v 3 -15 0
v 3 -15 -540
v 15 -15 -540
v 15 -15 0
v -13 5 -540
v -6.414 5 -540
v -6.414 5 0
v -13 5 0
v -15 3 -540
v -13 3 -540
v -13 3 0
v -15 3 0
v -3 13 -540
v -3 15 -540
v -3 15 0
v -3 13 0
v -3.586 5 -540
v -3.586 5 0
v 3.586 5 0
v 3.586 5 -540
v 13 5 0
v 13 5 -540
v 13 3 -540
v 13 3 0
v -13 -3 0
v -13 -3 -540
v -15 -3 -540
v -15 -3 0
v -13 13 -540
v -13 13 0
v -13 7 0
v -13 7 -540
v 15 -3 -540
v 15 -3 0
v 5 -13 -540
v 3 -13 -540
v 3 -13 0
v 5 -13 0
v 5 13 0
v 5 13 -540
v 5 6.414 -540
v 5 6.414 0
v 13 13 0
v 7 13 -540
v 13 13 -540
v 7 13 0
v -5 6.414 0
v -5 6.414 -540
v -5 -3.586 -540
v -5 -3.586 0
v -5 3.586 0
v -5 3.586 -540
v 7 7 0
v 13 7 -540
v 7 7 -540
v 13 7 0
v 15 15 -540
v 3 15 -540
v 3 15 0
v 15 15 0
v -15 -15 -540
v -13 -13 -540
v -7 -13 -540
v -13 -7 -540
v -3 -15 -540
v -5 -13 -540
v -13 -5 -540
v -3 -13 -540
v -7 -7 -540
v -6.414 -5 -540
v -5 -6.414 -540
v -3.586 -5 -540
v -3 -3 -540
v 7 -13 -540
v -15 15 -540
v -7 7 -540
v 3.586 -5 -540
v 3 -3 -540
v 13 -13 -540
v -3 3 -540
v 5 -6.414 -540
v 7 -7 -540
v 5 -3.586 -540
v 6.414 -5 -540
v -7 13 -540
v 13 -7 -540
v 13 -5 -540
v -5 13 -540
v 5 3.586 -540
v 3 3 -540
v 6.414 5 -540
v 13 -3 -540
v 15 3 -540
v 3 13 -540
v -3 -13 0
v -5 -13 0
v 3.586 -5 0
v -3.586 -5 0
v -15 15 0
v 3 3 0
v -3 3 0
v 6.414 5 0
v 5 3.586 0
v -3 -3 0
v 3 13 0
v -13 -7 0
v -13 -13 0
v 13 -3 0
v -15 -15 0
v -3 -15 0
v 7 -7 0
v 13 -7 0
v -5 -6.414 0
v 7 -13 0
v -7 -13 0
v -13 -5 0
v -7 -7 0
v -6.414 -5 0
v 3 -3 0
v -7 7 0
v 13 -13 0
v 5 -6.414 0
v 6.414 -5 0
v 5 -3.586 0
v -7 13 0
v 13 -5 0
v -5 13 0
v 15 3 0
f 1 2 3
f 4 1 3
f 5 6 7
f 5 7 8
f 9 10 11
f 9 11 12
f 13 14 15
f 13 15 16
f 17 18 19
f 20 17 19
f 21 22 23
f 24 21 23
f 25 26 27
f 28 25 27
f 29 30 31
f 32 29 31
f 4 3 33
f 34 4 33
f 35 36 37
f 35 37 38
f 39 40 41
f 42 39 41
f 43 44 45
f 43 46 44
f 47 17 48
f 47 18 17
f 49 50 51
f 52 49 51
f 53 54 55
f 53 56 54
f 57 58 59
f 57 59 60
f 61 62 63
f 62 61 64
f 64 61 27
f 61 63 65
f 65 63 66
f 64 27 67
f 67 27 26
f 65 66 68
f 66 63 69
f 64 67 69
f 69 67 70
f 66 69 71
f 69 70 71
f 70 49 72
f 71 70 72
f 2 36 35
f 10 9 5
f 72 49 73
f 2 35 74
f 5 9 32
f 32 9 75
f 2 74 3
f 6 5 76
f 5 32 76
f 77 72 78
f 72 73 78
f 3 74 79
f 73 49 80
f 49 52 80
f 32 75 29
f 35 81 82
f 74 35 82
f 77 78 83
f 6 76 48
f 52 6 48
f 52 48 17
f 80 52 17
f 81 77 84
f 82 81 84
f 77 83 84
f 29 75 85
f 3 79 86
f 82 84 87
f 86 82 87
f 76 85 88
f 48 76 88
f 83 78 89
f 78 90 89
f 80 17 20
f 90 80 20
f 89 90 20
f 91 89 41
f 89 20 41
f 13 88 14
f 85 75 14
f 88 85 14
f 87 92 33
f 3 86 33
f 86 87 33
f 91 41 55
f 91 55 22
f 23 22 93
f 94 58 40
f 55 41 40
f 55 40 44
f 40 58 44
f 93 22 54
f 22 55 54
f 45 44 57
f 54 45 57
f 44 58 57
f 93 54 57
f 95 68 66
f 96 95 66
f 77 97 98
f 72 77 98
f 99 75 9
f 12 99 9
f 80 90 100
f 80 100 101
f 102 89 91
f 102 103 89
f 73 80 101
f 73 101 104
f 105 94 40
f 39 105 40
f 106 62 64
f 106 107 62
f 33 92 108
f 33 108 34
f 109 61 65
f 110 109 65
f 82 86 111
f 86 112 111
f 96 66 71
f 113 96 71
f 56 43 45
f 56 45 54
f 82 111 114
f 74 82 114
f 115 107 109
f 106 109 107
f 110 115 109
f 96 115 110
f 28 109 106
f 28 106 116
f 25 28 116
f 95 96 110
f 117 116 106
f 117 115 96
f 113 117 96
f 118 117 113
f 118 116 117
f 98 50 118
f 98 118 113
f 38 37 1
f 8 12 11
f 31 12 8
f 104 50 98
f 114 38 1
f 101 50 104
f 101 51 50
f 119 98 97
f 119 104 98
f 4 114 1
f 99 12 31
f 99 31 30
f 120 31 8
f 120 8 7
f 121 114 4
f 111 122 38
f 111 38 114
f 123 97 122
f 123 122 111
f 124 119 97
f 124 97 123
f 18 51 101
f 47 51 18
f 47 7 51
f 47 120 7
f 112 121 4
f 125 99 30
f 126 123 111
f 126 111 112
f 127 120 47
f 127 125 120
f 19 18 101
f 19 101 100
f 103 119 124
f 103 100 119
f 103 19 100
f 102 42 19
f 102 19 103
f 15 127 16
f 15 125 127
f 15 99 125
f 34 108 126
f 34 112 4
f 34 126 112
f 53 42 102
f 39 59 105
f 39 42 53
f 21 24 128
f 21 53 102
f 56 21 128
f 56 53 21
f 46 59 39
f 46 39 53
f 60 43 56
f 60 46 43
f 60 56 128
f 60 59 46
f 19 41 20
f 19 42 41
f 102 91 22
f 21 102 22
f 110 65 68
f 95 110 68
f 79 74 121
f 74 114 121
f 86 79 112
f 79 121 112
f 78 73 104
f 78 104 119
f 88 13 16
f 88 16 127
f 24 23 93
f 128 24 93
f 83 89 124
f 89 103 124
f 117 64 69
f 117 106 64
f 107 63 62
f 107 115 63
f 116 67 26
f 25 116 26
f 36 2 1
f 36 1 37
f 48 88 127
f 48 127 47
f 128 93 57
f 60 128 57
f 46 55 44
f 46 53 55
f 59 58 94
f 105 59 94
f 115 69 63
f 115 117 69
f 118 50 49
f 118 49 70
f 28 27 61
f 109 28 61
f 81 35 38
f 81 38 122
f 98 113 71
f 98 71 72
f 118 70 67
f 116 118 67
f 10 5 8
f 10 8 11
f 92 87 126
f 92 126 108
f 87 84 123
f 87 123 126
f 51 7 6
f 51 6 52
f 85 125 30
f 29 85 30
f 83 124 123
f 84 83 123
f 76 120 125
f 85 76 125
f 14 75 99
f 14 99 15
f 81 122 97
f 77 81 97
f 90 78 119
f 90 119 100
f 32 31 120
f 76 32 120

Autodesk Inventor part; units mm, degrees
ref_plane "YZ Plane" through (0, 0, 0) normal (1, 0, 0) x (0, 1, 0)
ref_plane "XZ Plane" through (0, 0, 0) normal (0, 1, 0) x (-1, 0, 0)
ref_plane "XY Plane" through (0, 0, 0) normal (0, 0, 1) x (1, 0, 0)
sketch "스케치1" plane through (0, 0, 0) normal (0, 0, 1) x (1, 0, 0)
  line L0 (-15, 15) -> (15, 15)
  line L1 (15, 15) -> (-15, 15)
  line L2 (-15, 15) -> (-15, -15)
  line L3 (-15, -15) -> (15, -15)
  line L4 (15, -15) -> (15, 15)
  line L5 (-15, -15) -> (-5, -15)
  line L6 (-5, -15) -> (-5, -5)
  line L7 (-5, -5) -> (-15, -5)
  line L8 (-15, -5) -> (-15, -15)
  line L9 (-15, 15) -> (-5, 15)
  line L10 (-5, 15) -> (-5, 5)
  line L11 (-5, 5) -> (-15, 5)
  line L12 (-15, 5) -> (-15, 15)
  line L13 (15, -15) -> (5, -15)
  line L14 (5, -15) -> (5, -5)
  line L15 (5, -5) -> (15, -5)
  line L16 (15, -5) -> (15, -15)
  line L17 (15, 15) -> (5, 15)
  line L18 (5, 15) -> (5, 5)
  line L19 (5, 5) -> (15, 5)
  line L20 (15, 5) -> (15, 15)
  line L21 (-13, -7) -> (-7, -7)
  line L22 (-7, -7) -> (-7, -13)
  line L23 (-7, -13) -> (-13, -13)
  line L24 (-13, -13) -> (-13, -7)
  line L25 (-13, 7) -> (-7, 7)
  line L26 (-7, 7) -> (-7, 13)
  line L27 (-7, 13) -> (-13, 13)
  line L28 (-13, 13) -> (-13, 7)
  line L29 (7, -7) -> (7, -13)
  line L30 (7, -13) -> (13, -13)
  line L31 (13, -13) -> (13, -7)
  line L32 (13, -7) -> (7, -7)
  line L33 (7, 7) -> (7, 13)
  line L34 (7, 13) -> (13, 13)
  line L35 (13, 13) -> (13, 7)
  line L36 (13, 7) -> (7, 7)
  line L37 (-5, -15) -> (-3, -15)
  line L38 (-3, -15) -> (-3, -13)
  line L39 (-3, -13) -> (-5, -13)
  line L40 (-5, -13) -> (-5, -15)
  line L41 (5, -15) -> (3, -15)
  line L42 (3, -15) -> (3, -13)
  line L43 (3, -13) -> (5, -13)
  line L44 (5, -13) -> (5, -15)
  line L45 (5, 15) -> (3, 15)
  line L46 (3, 15) -> (3, 13)
  line L47 (3, 13) -> (5, 13)
  line L48 (5, 13) -> (5, 15)
  line L49 (-5, 15) -> (-3, 15)
  line L50 (-3, 15) -> (-3, 13)
  line L51 (-3, 13) -> (-5, 13)
  line L52 (-5, 13) -> (-5, 15)
  line L53 (15, -5) -> (13, -5)
  line L54 (13, -5) -> (13, -3)
  line L55 (13, -3) -> (15, -3)
  line L56 (15, -3) -> (15, -5)
  line L57 (15, 5) -> (13, 5)
  line L58 (13, 5) -> (13, 3)
  line L59 (13, 3) -> (15, 3)
  line L60 (15, 3) -> (15, 5)
  line L61 (-15, -5) -> (-13, -5)
  line L62 (-13, -5) -> (-13, -3)
  line L63 (-13, -3) -> (-15, -3)
  line L64 (-15, -3) -> (-15, -5)
  line L65 (-15, 5) -> (-13, 5)
  line L66 (-13, 5) -> (-13, 3)
  line L67 (-13, 3) -> (-15, 3)
  line L68 (-15, 3) -> (-15, 5)
  line L69 (5, -5) -> (-5, -5)
  line L70 (-5, -5) -> (-5, 5)
  line L71 (-5, 5) -> (5, 5)
  line L72 (5, 5) -> (5, -5)
  line L73 (5, -5) -> (-5, 5) construction
  line L74 (-5, -5) -> (5, 5) construction
  line L75 (-3.5858, -5) -> (-5, -3.5858)
  line L76 (-5, -3.5858) -> (-6.4142, -5)
  line L77 (-6.4142, -5) -> (-5, -6.4142)
  line L78 (-5, -6.4142) -> (-3.5858, -5)
  line L79 (-3.5858, -5) -> (-6.4142, -5) construction
  line L80 (-5, -3.5858) -> (-5, -6.4142) construction
  line L81 (-3.5858, 5) -> (-5, 6.4142)
  line L82 (-5, 6.4142) -> (-6.4142, 5)
  line L83 (-6.4142, 5) -> (-5, 3.5858)
  line L84 (-5, 3.5858) -> (-3.5858, 5)
  line L85 (-3.5858, 5) -> (-6.4142, 5) construction
  line L86 (-5, 6.4142) -> (-5, 3.5858) construction
  line L87 (5, 3.5858) -> (6.4142, 5)
  line L88 (6.4142, 5) -> (5, 6.4142)
  line L89 (5, 6.4142) -> (3.5858, 5)
  line L90 (3.5858, 5) -> (5, 3.5858)
  line L91 (5, 3.5858) -> (5, 6.4142) construction
  line L92 (6.4142, 5) -> (3.5858, 5) construction
  line L93 (5, -3.5858) -> (6.4142, -5)
  line L94 (6.4142, -5) -> (5, -6.4142)
  line L95 (5, -6.4142) -> (3.5858, -5)
  line L96 (3.5858, -5) -> (5, -3.5858)
  line L97 (5, -3.5858) -> (5, -6.4142) construction
  line L98 (6.4142, -5) -> (3.5858, -5) construction
  line L99 (3, 3) -> (-3, 3)
  line L100 (-3, 3) -> (-3, -3)
  line L101 (-3, -3) -> (3, -3)
  line L102 (3, -3) -> (3, 3)
  point P0 (0, 0)
  point P1 (0, 0)
  point P2 (-10, 162)
  point P3 (-10, 162)
  point P4 (-10, 162)
  point P5 (-10, 162)
  point P6 (-18, 162)
  point P7 (-8, 152)
  point P8 (-10, 154)
  point P9 (0, 172)
  point P10 (0, 172)
  point P11 (0, 172)
  point P12 (0, 172)
  point P13 (8, 172)
  point P14 (10, 170)
  point P15 (-2, 182)
  point P16 (0, 180)
  point P17 (0, 162)
  point P18 (0, 162)
  point P19 (0, 162)
  point P20 (0, 162)
  point P21 (8, 162)
  point P22 (0, 154)
  point P23 (-2, 152)
  point P24 (10, 164)
  point P25 (-18, 172)
  point P26 (-10, 180)
  point P27 (-8, 182)
  point P28 (1.4142, 162)
  point P29 (0, 163.4142)
  point P30 (-1.4142, 162)
  point P31 (0, 160.5858)
  point P32 (0, 173.4142)
  point P33 (-1.4142, 172)
  point P34 (0, 170.5858)
  point P35 (1.4142, 172)
  point P36 (-11.4142, 172)
  point P37 (-10, 170.5858)
  point P38 (-8.5858, 172)
  point P39 (-10, 173.4142)
  point P40 (-10, 160.5858)
  point P41 (-8.5858, 162)
  point P42 (-10, 163.4142)
  point P43 (-11.4142, 162)
  point P44 (-18, 162)
  point P45 (-20, 162)
  point P46 (-10, 152)
  point P47 (-20, 182)
  point P48 (-20, 164)
  point P49 (-20, 164)
  point P50 (-20, 162)
  point P51 (-20, 170)
  point P52 (0, 0)
  point P53 (5, 15)
  dimension "d0" = 30
  dimension "d1" = 10
  dimension "d2" = 10
  dimension "d3" = 10
  dimension "d4" = 10
  dimension "d5" = 10
  dimension "d6" = 10
  dimension "d7" = 10
  dimension "d8" = 10
  dimension "d9" = 2
  dimension "d10" = 2
  dimension "d11" = 2
  dimension "d12" = 2
  dimension "d13" = 2
  dimension "d14" = 2
  dimension "d15" = 2
  dimension "d16" = 2
  dimension "d17" = 2
  dimension "d18" = 2
  dimension "d19" = 2
  dimension "d20" = 2
  dimension "d21" = 2
  dimension "d22" = 2
  dimension "d23" = 2
  dimension "d24" = 2
  dimension "d25" = 2
  dimension "d26" = 2
  dimension "d27" = 2
  dimension "d28" = 2
  dimension "d29" = 2
  dimension "d30" = 2
  dimension "d31" = 2
  dimension "d32" = 2
  dimension "d33" = 2
  dimension "d34" = 2
  dimension "d35" = 2
  dimension "d36" = 2
  dimension "d37" = 2
extrude "돌출1" add sketch "스케치1" against normal blind 540 contours L0 L10 L82 L11 L2 | L0 L50 L51 L10 | L11 L66 L67 L2 | L0 L18 L47 L46 | L81 L71 L10 | L10 L11 L82 | L63 L62 L7 L2 | L11 L70 L83 | L0 L4 L19 L88 L18 | L71 L84 L70 | L71 L90 L72 L96 L69 L75 L70 L84 | L7 L77 L6 L3 L2 | L89 L18 L71 | L71 L72 L90 | L75 L69 L70 | L70 L7 L76 | L4 L59 L58 L19 | L88 L19 L18 | L19 L87 L72 | L6 L39 L38 L3 | L7 L6 L77 | L69 L78 L6 | L93 L15 L72 | L72 L69 L96 | L69 L14 L95 | L4 L15 L54 L55 | L15 L94 L14 | L15 L4 L3 L14 L94 | L42 L43 L14 L3
properties part number "cross_AL_profile"
